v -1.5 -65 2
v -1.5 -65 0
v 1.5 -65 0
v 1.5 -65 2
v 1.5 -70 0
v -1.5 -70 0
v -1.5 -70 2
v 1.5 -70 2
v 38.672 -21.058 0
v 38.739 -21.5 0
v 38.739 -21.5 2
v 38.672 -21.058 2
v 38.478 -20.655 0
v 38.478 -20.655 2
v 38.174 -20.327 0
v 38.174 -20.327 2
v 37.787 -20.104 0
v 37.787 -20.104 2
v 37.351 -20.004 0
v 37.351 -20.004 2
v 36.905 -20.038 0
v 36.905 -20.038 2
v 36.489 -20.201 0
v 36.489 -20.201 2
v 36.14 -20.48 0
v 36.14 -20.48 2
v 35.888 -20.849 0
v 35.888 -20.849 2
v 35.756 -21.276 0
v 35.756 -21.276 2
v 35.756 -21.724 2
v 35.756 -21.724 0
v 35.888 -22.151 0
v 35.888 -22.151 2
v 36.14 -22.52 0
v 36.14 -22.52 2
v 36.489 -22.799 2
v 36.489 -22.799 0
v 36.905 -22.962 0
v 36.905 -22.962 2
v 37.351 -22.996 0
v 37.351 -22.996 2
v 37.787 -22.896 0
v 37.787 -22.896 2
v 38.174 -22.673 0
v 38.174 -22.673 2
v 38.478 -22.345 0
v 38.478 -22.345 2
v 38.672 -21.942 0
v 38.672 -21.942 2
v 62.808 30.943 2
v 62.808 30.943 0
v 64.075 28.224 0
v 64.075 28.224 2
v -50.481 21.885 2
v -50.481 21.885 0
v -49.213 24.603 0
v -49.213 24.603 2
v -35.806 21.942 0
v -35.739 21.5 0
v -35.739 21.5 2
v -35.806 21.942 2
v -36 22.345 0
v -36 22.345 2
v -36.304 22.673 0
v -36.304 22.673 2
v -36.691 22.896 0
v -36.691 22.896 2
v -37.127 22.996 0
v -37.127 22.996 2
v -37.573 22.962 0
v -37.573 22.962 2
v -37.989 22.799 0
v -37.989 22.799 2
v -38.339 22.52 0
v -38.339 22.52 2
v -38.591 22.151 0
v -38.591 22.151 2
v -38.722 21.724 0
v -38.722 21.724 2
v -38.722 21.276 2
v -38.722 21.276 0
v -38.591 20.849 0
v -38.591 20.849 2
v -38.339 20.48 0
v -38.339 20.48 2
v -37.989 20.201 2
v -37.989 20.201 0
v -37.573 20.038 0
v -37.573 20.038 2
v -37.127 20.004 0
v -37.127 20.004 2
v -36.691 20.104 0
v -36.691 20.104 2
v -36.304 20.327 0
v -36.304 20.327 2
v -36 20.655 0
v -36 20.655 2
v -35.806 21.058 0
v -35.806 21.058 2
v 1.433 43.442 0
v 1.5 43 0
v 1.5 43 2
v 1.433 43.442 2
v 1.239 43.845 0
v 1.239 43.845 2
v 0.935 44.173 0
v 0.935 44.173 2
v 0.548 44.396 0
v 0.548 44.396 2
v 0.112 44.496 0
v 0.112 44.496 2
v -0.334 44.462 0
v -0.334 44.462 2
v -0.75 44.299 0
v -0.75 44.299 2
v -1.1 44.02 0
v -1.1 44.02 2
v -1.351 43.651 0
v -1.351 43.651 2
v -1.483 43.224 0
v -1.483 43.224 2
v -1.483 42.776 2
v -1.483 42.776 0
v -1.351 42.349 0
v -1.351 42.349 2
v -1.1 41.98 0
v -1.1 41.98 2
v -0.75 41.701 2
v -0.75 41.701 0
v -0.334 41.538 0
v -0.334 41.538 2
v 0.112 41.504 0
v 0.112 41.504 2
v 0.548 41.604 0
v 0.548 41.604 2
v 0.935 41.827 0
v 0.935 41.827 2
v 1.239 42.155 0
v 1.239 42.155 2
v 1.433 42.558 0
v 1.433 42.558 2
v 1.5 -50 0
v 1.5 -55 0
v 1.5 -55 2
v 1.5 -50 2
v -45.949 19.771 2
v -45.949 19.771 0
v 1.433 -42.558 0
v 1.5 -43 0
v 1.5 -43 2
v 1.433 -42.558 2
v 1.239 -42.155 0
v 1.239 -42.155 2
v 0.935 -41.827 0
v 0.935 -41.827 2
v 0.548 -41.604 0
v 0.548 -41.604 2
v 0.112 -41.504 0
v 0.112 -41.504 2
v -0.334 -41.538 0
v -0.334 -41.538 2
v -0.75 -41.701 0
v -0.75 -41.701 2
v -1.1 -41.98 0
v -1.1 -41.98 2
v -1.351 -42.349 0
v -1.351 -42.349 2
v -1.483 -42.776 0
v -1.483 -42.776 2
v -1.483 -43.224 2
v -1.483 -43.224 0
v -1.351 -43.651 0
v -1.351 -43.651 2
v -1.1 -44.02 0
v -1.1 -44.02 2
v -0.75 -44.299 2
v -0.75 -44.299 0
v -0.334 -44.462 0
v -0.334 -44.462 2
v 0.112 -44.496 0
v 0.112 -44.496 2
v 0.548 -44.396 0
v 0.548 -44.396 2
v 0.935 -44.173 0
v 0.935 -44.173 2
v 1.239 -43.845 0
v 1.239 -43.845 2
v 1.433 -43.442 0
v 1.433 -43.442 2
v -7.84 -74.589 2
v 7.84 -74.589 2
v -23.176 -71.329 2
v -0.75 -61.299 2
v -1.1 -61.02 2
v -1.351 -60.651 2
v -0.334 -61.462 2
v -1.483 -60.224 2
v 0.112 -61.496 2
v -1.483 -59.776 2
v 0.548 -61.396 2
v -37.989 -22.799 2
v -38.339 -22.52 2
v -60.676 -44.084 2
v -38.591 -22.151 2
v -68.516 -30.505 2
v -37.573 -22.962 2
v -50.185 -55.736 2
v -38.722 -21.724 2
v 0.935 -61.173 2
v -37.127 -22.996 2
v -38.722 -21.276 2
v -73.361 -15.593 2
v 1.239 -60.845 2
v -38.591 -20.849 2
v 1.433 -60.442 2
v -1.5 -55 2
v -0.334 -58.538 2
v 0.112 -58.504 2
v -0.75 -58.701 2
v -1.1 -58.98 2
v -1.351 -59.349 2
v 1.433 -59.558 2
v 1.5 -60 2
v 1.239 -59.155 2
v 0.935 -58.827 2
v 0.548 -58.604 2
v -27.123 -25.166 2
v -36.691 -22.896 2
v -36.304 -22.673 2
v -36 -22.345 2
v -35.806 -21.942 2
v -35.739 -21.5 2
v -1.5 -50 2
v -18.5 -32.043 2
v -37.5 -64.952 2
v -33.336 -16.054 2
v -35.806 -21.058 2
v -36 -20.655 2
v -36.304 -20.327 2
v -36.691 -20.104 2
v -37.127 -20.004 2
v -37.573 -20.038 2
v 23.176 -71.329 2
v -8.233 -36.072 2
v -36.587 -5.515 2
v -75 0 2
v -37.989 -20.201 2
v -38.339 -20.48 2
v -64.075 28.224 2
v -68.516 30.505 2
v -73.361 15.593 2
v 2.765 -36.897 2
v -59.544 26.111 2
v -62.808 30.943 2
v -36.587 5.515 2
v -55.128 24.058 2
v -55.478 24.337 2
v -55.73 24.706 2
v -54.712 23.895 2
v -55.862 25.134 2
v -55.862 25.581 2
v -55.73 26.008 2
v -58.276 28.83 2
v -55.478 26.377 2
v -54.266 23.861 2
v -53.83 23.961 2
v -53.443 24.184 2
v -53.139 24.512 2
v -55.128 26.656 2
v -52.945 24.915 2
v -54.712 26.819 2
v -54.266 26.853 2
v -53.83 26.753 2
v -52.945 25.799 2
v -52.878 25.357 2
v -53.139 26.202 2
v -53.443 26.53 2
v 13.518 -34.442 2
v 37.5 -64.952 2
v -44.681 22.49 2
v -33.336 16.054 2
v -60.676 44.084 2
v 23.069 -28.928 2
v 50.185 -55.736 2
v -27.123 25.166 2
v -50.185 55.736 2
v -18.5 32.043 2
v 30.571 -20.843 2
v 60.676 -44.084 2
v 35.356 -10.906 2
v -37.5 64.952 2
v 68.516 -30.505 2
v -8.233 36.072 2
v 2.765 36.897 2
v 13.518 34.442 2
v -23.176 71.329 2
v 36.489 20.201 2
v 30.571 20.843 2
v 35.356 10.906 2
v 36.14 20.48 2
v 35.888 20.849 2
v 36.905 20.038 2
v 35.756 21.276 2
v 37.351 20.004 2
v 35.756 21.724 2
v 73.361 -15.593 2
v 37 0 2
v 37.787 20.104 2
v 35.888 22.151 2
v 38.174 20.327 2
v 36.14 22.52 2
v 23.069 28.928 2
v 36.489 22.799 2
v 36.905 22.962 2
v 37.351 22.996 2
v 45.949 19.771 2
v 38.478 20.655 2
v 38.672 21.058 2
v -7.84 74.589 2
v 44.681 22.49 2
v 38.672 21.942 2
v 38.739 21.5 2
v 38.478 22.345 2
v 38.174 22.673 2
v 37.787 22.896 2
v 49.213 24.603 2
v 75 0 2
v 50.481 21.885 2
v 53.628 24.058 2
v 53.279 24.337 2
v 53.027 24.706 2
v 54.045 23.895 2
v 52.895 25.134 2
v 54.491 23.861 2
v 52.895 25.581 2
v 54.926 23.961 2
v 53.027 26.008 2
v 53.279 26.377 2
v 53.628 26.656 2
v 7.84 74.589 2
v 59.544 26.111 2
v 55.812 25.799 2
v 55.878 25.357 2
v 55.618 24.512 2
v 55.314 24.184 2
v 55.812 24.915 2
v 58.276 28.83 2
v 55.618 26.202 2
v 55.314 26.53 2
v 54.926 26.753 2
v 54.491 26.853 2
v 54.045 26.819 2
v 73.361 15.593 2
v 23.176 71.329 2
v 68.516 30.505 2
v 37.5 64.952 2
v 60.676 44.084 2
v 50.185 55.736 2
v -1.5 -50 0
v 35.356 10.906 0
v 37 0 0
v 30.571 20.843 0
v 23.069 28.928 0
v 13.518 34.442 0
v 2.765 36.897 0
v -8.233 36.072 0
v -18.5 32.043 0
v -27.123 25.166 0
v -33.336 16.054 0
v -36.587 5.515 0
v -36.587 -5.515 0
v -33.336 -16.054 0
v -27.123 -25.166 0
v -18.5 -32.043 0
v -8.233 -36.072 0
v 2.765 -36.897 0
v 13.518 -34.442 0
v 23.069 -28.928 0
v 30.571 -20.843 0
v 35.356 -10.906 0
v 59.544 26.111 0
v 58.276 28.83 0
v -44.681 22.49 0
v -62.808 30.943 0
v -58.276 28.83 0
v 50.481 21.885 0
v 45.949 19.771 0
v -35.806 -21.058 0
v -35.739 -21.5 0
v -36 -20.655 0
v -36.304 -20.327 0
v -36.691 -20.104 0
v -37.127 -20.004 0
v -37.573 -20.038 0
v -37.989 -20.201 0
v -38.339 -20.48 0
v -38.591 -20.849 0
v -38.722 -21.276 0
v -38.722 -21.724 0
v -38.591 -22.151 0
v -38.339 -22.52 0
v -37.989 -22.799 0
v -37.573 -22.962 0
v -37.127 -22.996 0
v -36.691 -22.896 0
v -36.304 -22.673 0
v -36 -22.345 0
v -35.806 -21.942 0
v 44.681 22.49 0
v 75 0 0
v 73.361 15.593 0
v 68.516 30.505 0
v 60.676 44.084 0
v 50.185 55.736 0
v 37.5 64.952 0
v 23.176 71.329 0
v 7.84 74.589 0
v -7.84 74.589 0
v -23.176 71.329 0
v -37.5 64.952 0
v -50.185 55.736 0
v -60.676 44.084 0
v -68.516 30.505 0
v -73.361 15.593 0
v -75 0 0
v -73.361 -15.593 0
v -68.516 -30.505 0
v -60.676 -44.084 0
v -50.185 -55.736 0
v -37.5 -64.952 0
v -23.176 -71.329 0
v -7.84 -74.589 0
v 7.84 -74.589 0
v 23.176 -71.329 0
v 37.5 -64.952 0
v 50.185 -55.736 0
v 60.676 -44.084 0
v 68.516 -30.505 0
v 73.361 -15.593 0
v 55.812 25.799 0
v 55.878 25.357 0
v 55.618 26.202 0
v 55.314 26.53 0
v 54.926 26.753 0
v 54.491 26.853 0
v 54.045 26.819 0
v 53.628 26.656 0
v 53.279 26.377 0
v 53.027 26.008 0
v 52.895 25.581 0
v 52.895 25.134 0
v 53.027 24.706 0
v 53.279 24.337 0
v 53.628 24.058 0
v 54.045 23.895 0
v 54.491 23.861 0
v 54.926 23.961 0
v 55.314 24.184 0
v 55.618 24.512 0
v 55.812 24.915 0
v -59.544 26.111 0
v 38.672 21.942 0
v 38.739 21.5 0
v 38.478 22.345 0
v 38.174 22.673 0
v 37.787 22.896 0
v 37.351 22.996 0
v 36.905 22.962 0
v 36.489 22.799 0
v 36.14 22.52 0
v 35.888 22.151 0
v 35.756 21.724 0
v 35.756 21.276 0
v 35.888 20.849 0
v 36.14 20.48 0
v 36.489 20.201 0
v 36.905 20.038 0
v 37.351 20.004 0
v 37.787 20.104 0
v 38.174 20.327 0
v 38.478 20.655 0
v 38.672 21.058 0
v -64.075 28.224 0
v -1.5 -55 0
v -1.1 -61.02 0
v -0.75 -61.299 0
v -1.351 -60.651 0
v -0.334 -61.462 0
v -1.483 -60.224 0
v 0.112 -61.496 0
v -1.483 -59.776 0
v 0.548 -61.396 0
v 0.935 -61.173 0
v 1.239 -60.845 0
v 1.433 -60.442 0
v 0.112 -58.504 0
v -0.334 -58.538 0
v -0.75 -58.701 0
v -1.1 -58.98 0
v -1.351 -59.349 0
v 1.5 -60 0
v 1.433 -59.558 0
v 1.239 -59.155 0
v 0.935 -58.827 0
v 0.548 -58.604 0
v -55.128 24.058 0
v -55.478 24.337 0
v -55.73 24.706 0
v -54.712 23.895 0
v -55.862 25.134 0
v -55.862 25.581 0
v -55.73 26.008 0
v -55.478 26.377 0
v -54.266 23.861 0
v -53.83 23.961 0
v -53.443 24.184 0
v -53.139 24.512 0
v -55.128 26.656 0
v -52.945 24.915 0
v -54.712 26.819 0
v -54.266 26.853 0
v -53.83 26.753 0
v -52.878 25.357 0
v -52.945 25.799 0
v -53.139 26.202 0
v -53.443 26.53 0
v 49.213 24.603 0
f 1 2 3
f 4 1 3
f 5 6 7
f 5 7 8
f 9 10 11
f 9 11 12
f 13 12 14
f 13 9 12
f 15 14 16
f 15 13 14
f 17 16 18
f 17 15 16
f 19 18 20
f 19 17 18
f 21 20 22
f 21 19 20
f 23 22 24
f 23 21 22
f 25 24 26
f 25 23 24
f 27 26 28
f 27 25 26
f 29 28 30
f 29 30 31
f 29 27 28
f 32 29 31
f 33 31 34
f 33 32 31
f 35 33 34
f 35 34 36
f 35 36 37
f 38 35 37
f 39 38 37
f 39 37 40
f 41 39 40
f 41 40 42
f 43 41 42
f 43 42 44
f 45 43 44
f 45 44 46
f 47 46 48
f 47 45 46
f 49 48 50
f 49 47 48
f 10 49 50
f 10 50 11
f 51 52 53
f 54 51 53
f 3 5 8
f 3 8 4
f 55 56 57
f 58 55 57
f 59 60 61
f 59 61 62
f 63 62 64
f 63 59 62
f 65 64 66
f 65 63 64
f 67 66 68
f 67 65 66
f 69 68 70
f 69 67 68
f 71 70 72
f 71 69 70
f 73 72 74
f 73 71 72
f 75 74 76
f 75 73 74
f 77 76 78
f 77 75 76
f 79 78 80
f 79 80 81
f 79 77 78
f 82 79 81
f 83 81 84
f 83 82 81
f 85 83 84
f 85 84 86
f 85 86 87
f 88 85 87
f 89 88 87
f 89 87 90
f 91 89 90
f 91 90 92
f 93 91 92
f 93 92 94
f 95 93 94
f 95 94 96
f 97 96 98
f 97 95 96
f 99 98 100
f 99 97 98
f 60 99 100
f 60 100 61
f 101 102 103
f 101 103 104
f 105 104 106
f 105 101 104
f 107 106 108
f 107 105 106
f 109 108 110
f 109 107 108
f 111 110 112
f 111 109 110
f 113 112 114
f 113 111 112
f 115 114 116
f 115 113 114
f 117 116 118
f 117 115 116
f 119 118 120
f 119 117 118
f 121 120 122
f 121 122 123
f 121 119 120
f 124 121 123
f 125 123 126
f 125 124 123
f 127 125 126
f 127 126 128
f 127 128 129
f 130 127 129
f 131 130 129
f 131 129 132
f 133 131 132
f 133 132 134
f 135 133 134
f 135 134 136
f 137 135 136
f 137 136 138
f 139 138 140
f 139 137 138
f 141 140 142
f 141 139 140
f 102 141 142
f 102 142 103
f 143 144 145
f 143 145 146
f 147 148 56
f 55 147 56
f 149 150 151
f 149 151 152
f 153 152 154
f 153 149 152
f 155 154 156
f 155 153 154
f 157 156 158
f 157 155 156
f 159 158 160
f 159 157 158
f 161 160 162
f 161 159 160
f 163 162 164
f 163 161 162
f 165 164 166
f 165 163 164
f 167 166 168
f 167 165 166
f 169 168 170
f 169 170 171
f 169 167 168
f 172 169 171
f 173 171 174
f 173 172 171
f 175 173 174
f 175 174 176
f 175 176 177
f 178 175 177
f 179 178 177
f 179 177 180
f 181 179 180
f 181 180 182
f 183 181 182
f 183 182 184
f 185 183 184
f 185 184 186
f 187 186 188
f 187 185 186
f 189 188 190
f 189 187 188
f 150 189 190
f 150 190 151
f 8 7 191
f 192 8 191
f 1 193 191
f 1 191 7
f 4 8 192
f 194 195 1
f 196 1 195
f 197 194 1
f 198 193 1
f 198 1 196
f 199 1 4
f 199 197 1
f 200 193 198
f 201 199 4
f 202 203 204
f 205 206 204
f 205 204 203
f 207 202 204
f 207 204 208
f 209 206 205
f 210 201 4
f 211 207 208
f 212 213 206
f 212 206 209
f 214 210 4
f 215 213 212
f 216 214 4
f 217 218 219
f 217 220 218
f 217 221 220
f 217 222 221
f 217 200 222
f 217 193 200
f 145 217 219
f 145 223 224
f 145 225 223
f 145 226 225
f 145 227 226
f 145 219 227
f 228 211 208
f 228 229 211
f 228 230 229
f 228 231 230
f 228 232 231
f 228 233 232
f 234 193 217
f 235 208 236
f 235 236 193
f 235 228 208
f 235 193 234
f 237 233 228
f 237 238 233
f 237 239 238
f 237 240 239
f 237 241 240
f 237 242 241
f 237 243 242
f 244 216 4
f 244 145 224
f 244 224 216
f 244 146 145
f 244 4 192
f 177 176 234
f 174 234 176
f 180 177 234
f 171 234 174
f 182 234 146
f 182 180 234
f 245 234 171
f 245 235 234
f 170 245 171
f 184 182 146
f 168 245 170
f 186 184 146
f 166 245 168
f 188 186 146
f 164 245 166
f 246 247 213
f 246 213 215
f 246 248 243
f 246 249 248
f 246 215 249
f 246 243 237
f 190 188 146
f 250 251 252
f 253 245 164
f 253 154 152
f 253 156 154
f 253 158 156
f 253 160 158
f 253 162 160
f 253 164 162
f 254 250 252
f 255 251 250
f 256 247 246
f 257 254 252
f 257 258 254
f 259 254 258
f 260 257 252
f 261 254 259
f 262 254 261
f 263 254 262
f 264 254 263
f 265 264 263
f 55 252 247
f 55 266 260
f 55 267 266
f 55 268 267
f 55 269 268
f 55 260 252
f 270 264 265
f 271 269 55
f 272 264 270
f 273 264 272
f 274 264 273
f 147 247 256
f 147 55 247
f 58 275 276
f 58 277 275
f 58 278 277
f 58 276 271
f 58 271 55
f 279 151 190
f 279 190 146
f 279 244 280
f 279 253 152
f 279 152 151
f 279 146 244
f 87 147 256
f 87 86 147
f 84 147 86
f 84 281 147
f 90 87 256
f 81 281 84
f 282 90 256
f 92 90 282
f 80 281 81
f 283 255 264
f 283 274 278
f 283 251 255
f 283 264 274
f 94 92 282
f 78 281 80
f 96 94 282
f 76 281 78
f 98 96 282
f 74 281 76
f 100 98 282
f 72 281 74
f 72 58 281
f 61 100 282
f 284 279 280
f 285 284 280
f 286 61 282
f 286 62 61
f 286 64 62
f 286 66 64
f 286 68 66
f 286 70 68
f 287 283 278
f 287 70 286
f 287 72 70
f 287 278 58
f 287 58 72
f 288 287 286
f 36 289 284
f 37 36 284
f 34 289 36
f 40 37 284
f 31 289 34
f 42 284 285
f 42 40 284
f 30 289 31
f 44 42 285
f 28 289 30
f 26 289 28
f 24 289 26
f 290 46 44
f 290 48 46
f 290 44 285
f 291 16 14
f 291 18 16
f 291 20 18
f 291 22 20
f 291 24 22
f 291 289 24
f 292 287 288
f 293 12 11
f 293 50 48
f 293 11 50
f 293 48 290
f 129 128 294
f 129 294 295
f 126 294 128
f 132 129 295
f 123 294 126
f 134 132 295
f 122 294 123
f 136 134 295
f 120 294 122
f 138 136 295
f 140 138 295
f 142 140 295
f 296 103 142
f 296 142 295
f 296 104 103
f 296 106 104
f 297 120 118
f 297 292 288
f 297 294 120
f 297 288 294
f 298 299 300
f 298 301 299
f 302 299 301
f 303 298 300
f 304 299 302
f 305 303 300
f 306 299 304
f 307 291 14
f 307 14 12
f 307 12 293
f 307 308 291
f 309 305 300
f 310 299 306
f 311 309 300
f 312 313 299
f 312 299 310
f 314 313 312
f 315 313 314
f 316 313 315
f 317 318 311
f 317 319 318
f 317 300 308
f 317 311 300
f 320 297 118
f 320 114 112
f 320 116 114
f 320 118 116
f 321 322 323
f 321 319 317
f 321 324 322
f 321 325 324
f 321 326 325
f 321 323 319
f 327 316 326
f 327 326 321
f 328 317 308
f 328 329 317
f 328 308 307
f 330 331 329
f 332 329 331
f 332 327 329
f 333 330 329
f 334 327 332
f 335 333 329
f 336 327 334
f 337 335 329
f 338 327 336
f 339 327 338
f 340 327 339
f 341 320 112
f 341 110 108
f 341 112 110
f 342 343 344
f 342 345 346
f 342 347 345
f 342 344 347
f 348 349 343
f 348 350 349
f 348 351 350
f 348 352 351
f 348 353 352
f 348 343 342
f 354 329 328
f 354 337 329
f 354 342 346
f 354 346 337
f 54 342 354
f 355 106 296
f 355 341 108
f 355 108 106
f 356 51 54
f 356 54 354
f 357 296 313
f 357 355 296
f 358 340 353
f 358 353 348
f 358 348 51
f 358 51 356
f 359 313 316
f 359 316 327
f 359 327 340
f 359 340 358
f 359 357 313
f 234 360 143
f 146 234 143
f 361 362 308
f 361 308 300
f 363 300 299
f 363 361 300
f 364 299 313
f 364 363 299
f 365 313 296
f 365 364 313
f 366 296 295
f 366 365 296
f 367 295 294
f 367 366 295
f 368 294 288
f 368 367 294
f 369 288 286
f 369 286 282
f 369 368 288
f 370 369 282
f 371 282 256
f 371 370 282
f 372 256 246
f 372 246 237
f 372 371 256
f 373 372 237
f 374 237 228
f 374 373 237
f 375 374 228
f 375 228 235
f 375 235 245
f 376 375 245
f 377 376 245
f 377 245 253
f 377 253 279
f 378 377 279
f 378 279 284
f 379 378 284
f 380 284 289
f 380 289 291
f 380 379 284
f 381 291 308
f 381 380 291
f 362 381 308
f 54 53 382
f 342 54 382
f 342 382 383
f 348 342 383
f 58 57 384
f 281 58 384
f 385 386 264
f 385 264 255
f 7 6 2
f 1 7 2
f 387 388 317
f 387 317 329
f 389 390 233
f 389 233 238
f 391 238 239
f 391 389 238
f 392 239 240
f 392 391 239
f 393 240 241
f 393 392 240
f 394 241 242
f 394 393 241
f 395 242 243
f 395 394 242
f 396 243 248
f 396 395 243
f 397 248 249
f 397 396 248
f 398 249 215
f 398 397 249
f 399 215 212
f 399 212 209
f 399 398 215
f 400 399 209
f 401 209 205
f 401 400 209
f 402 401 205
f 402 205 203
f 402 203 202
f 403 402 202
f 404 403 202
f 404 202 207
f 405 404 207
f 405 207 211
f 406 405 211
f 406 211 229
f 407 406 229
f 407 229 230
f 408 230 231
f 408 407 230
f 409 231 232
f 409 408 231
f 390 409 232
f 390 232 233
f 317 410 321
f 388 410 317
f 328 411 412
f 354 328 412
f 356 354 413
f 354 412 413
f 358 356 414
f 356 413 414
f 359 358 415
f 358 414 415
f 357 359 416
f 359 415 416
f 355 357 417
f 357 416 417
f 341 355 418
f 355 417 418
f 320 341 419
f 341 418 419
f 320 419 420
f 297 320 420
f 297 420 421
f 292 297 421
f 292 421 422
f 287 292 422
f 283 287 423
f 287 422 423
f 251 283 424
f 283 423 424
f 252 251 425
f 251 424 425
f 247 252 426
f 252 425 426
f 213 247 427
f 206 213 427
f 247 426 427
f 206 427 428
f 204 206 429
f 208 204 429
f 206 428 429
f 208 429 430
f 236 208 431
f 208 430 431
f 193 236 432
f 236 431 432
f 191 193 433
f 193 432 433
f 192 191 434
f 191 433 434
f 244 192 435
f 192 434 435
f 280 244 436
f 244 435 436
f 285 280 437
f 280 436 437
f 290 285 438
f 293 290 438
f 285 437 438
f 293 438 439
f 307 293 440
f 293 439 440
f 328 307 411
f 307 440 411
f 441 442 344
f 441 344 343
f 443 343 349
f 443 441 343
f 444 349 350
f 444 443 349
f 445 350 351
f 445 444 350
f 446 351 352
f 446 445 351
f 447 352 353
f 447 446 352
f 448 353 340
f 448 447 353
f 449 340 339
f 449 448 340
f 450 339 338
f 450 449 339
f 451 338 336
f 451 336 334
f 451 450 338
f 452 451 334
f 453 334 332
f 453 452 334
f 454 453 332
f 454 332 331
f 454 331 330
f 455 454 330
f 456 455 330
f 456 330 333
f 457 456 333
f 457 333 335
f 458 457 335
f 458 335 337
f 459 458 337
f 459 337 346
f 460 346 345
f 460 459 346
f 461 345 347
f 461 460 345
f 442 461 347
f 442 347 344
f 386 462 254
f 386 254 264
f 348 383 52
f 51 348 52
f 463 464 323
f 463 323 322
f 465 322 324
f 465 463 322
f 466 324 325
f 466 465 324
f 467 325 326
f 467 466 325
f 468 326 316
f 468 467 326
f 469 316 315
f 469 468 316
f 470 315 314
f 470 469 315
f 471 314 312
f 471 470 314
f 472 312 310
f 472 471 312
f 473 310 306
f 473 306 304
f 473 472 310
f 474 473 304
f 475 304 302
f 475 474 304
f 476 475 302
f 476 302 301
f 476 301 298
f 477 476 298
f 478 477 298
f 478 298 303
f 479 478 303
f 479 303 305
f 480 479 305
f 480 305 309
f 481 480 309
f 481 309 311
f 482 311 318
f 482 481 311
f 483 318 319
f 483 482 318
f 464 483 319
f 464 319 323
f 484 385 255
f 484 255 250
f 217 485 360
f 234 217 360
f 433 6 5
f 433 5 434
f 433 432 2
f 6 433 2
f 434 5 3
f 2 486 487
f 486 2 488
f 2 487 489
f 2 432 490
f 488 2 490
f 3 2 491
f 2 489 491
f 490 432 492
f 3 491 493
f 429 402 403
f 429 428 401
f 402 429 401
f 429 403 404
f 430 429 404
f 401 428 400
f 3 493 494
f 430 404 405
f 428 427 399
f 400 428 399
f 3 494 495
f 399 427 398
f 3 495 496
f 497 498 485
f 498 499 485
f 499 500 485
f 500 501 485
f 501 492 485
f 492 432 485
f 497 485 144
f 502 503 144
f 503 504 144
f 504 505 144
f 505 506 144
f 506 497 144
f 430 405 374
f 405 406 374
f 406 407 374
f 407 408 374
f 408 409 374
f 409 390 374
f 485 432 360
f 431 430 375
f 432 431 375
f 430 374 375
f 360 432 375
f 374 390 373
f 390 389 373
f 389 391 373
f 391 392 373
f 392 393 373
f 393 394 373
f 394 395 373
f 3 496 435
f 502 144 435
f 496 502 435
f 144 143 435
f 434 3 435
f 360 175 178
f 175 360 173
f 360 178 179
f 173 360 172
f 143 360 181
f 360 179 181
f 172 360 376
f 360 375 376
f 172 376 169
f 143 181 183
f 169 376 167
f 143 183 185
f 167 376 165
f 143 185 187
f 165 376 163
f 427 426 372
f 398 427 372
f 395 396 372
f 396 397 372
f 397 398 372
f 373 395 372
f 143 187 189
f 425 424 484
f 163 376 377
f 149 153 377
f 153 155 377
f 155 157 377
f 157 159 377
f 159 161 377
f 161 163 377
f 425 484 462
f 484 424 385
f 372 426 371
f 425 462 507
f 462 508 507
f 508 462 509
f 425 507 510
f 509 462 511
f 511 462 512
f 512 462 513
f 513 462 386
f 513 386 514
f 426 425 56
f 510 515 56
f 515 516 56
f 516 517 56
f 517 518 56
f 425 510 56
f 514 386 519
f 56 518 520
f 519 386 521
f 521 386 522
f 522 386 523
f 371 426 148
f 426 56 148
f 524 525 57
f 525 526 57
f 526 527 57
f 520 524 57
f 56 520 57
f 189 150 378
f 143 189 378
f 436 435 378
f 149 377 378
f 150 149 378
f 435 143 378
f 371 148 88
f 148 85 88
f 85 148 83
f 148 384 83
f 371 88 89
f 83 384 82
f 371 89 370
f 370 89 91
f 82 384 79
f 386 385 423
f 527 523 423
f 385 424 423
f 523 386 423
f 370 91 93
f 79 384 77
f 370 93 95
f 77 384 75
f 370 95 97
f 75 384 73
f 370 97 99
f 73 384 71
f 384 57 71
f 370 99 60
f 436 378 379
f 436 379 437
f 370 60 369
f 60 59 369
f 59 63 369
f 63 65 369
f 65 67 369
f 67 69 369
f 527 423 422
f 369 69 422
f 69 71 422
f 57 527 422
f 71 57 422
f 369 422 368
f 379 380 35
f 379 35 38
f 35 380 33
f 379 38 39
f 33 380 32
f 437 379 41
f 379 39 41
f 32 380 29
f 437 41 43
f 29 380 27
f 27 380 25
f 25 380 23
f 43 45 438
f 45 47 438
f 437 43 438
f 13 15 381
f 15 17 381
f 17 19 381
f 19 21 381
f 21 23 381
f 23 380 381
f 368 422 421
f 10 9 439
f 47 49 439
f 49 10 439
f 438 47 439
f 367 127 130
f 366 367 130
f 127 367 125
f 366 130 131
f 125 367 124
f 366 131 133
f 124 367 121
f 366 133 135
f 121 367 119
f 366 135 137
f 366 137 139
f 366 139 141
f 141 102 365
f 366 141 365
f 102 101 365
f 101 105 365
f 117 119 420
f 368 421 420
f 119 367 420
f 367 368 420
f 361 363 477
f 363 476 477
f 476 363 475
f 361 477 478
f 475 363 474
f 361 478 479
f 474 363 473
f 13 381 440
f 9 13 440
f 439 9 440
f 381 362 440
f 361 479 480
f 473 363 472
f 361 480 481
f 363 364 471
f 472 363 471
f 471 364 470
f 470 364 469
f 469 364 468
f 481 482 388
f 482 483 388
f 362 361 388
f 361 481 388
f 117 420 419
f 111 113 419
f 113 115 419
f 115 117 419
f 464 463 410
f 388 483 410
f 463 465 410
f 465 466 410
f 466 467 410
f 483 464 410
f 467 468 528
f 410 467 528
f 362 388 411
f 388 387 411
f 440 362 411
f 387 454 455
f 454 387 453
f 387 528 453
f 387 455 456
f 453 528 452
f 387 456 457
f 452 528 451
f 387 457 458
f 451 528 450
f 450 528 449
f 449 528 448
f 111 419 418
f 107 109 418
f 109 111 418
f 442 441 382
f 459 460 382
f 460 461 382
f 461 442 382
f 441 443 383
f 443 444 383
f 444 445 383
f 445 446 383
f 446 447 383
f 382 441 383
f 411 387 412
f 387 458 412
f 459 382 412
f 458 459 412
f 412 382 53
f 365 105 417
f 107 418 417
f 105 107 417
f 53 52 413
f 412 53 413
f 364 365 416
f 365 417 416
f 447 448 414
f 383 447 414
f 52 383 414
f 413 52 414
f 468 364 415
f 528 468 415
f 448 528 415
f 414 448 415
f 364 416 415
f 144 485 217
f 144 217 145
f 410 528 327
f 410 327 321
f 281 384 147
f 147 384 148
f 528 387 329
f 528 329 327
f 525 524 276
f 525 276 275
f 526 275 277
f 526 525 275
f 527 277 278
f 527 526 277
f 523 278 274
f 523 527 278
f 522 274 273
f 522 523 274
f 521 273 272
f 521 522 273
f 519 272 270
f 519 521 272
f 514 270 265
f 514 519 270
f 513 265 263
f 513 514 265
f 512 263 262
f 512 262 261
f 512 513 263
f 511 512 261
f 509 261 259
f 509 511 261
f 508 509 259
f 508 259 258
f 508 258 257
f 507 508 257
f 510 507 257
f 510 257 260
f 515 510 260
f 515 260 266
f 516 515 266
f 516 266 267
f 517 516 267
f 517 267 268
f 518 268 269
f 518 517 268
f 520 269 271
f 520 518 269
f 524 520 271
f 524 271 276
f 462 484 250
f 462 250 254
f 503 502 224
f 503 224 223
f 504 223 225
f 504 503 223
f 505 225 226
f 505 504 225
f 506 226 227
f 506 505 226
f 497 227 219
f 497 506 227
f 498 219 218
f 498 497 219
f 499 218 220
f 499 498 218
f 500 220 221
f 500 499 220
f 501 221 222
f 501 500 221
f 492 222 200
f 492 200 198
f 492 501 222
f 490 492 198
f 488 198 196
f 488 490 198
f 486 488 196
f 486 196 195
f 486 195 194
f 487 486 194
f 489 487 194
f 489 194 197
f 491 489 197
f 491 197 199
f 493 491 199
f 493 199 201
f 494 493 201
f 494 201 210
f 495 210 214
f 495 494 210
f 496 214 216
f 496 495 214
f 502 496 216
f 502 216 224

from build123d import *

# Parameters (mm, degrees)
SKETCH1_R           = 75
SKETCH1_R_2         = 37
SKETCH1_R_3         = 1.5
SKETCH1_W           = 3
SKETCH1_H           = 5
BOSS_EXTRUDE1_DEPTH = 2


with BuildPart() as part:
    # Sketch1 → Boss-Extrude1 (new body)
    with BuildSketch(Plane.XY):
        Circle(SKETCH1_R)
        Circle(SKETCH1_R_2, mode=Mode.SUBTRACT)
        with Locations((0, -43)):
            Circle(SKETCH1_R_3, mode=Mode.SUBTRACT)
        with Locations((-37.239092363, -21.5)):
            Circle(SKETCH1_R_3, mode=Mode.SUBTRACT)
        with Locations((-37.239092363, 21.5)):
            Circle(SKETCH1_R_3, mode=Mode.SUBTRACT)
        with Locations((0, 43)):
            Circle(SKETCH1_R_3, mode=Mode.SUBTRACT)
        with Locations((37.239092363, 21.5)):
            Circle(SKETCH1_R_3, mode=Mode.SUBTRACT)
        with Locations((37.239092363, -21.5)):
            Circle(SKETCH1_R_3, mode=Mode.SUBTRACT)
        with Locations((0, -60)):
            Circle(SKETCH1_R_3, mode=Mode.SUBTRACT)
        with Locations((54.378467222, 25.357095704)):
            Circle(SKETCH1_R_3, mode=Mode.SUBTRACT)
        with Locations((-54.378467222, 25.357095704)):
            Circle(SKETCH1_R_3, mode=Mode.SUBTRACT)
        with Locations((0, -52.5)):
            Rectangle(SKETCH1_W, SKETCH1_H, mode=Mode.SUBTRACT)
        with Locations((0, -67.5)):
            Rectangle(SKETCH1_W, SKETCH1_H, mode=Mode.SUBTRACT)
        Polygon((49.213000894, 24.603466076), (44.681461959, 22.490374768), (45.949316744, 19.771451406), (50.48085568, 21.884542715), align=None, mode=Mode.SUBTRACT)
        Polygon((58.276078765, 28.829648694), (62.8076177, 30.942740002), (64.075472485, 28.223816641), (59.54393355, 26.110725333), align=None, mode=Mode.SUBTRACT)
        Polygon((-58.276078765, 28.829648694), (-62.8076177, 30.942740002), (-64.075472485, 28.223816641), (-59.54393355, 26.110725333), align=None, mode=Mode.SUBTRACT)
        Polygon((-49.213000894, 24.603466076), (-44.681461959, 22.490374768), (-45.949316744, 19.771451406), (-50.48085568, 21.884542715), align=None, mode=Mode.SUBTRACT)
    extrude(amount=BOSS_EXTRUDE1_DEPTH)


solid = part.part
